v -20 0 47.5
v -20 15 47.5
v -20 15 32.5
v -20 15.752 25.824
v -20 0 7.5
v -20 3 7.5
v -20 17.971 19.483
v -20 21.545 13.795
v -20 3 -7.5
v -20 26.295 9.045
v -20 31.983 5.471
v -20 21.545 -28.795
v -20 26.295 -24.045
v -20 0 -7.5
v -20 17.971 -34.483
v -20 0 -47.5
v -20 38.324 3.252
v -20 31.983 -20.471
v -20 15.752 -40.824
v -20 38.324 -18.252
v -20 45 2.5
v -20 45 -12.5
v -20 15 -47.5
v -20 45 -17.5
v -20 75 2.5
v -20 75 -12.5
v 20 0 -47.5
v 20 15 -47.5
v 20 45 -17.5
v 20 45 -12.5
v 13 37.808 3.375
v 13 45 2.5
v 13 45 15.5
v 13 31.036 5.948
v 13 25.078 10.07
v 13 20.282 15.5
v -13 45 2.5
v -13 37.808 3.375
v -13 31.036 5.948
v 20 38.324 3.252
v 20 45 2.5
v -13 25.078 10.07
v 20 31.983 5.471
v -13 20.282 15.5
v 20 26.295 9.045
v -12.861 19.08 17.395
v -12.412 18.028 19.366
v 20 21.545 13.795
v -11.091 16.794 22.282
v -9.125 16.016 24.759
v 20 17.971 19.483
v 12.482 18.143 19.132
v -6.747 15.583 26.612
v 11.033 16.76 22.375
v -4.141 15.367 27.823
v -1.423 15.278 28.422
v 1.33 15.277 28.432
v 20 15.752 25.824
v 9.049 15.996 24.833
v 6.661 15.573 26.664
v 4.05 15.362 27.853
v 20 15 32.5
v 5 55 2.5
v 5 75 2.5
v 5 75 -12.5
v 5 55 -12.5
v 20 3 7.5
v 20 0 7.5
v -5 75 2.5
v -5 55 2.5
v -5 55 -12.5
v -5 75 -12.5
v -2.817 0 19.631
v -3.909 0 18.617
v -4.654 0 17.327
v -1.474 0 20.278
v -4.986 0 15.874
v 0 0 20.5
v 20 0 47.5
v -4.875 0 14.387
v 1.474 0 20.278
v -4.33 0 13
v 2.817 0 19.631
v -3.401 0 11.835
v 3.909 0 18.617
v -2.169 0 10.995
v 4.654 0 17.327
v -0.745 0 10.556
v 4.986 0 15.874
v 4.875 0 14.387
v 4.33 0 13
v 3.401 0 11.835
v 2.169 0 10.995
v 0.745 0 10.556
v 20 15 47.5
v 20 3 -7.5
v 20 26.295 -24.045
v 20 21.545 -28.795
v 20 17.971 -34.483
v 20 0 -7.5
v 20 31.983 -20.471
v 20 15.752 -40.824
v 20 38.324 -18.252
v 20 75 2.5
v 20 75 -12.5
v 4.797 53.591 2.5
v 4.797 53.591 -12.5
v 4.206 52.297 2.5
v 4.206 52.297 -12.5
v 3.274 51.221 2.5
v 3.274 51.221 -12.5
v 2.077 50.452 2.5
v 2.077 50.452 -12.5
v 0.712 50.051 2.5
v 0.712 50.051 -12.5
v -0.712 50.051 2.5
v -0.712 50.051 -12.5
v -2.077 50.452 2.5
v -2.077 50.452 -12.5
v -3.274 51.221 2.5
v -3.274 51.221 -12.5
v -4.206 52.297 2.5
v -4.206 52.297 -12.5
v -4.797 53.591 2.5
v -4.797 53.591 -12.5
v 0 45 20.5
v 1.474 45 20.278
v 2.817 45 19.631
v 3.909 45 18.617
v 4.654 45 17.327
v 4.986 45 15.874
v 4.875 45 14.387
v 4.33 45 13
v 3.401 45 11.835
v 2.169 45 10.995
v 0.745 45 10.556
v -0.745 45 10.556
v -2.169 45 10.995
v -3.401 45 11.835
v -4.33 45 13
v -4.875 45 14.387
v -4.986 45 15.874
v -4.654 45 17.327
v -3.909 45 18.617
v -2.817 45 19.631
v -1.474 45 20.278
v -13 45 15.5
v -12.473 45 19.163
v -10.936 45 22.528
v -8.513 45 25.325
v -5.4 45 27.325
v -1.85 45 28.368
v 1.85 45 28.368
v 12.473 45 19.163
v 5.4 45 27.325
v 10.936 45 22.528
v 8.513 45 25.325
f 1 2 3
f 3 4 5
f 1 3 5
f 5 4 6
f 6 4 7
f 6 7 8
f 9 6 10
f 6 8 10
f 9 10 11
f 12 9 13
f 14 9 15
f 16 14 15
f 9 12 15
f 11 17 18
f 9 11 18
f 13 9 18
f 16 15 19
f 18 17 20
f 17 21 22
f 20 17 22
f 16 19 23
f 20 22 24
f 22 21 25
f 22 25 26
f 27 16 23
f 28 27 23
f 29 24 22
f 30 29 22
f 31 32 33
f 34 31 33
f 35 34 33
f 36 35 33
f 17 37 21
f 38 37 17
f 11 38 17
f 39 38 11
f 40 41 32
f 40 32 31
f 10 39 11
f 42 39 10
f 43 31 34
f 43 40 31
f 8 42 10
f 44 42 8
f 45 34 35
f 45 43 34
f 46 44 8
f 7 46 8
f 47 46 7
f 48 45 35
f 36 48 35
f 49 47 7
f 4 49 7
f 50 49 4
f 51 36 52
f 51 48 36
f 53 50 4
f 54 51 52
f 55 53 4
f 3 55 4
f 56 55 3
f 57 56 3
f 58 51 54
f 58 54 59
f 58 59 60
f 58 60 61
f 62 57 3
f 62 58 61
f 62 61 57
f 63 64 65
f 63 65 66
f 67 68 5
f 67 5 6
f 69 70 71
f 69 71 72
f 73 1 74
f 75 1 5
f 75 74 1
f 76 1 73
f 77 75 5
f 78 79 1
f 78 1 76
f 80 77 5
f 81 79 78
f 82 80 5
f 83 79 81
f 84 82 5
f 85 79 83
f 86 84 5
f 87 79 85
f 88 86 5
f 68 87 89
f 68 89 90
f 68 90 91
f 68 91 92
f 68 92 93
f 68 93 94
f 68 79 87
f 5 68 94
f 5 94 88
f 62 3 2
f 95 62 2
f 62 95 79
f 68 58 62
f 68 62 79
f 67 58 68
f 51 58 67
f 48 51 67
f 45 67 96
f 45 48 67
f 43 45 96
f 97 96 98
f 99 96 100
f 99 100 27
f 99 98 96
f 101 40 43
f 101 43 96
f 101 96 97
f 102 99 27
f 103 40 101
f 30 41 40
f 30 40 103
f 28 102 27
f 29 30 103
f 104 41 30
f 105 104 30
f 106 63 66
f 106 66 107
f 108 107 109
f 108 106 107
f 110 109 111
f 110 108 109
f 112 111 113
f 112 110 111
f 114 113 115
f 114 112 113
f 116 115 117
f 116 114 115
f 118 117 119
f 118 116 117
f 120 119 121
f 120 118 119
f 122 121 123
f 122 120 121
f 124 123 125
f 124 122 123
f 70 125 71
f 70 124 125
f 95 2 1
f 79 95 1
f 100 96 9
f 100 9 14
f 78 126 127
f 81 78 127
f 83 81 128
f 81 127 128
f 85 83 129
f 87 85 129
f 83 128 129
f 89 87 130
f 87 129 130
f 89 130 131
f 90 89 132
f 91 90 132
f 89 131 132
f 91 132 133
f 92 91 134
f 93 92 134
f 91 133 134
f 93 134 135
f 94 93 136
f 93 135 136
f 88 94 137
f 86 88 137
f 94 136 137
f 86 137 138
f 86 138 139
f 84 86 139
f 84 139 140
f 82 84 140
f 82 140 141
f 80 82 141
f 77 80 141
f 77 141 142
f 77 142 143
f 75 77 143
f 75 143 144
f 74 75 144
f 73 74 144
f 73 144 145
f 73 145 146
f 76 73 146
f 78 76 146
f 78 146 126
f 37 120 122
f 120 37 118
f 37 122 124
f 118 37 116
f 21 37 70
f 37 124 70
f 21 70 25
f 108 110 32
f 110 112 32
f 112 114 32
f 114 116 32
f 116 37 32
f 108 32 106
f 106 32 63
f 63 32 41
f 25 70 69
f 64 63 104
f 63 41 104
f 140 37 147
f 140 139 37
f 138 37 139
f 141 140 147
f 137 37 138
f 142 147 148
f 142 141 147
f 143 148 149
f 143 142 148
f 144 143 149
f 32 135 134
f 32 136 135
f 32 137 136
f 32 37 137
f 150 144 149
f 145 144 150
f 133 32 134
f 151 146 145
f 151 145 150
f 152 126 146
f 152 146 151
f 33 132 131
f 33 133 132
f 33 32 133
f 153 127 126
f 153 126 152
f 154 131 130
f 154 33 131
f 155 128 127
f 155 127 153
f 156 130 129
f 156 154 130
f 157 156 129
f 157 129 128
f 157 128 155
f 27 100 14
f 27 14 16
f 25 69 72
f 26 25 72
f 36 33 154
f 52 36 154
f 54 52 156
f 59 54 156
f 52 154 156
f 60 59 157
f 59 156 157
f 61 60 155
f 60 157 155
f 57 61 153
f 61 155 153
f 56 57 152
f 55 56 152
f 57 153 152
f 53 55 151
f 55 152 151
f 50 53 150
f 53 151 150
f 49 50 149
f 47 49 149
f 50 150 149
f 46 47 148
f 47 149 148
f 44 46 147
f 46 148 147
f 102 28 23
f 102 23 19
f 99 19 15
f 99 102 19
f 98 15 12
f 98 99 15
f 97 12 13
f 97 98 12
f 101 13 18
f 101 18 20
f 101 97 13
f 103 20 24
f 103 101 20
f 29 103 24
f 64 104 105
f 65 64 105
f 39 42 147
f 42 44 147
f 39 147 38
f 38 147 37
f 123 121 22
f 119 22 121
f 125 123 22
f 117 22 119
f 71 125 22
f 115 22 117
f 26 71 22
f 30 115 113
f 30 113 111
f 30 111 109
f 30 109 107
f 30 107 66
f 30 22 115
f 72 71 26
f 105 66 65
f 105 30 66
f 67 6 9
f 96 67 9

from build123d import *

# Parameters (mm, degrees)
BOSS_EXTRUDE4_DEPTH      = 20
BOSS_EXTRUDE5_REACH      = 70.42
BOSS_EXTRUDE5_END_RADIUS = 30
SKETCH7_R                = 5
CUT_EXTRUDE1_DEPTH       = 69.419660946
SKETCH8_W                = 15
SKETCH8_H                = 30
BOSS_EXTRUDE6_DEPTH      = 40
CUT_EXTRUDE2_REACH       = 94.331


with BuildPart() as part:
    # Sketch1 → Boss-Extrude4 (new, symmetric)
    with BuildSketch(Plane(origin=(0, 0, 0), x_dir=(0, 0, -1), z_dir=(1, 0, 0))):
        with BuildLine():
            Line((-47.5, 0), (-7.5, 0))
            Line((-7.5, 0), (-7.5, 3))
            Line((-7.5, 3), (7.5, 3))
            Line((7.5, 3), (7.5, 0))
            Line((7.5, 0), (47.5, 0))
            Line((47.5, 0), (47.5, 15))
            ThreePointArc((47.5, 15), (26.286796564, 23.786796564), (17.5, 45))
            Line((17.5, 45), (12.5, 45))
            Line((12.5, 45), (-2.5, 45))
            ThreePointArc((-2.5, 45), (-11.286796564, 23.786796564), (-32.5, 15))
            Line((-32.5, 15), (-47.5, 15))
            Line((-47.5, 15), (-47.5, 0))
        make_face()
    extrude(amount=BOSS_EXTRUDE4_DEPTH, both=True)

    # Boss-Extrude5: up to this cylinder (the profile starts inside it)
    boss_extrude5_end = Plane(origin=(0, 45, 32.5), z_dir=(-1, 0, 0)) * Cylinder(BOSS_EXTRUDE5_END_RADIUS, 201.84, mode=Mode.PRIVATE)
    # Sketch6 → Boss-Extrude5 (add, up to the surface)
    with BuildSketch(Plane(origin=(0, 45, 0), x_dir=(1, 0, 0), z_dir=(0, 1, 0)), mode=Mode.PRIVATE) as boss_extrude5_sk1:
        with BuildLine():
            Line((-13, -15.5), (-13, -2.5))
            Line((-13, -2.5), (13, -2.5))
            Line((13, -2.5), (13, -15.5))
            ThreePointArc((13, -15.5), (0, -28.5), (-13, -15.5))
        make_face()
    boss_extrude5_tool1 = extrude(boss_extrude5_sk1.sketch, amount=-BOSS_EXTRUDE5_REACH, mode=Mode.PRIVATE) & boss_extrude5_end
    add(boss_extrude5_tool1.solids().sort_by_distance((0, 45, 14.286452))[0])

    # Sketch7 → Cut-Extrude1 (cut, through all)
    with BuildSketch(Plane(origin=(0, 45, 0), x_dir=(1, 0, 0), z_dir=(0, 1, 0))):
        with Locations(Location((0, -15.5, 0), (0, 0, 270))):
            Circle(SKETCH7_R)
    extrude(amount=-CUT_EXTRUDE1_DEPTH, mode=Mode.SUBTRACT)

    # Sketch8 → Boss-Extrude6 (add)
    with BuildSketch(Plane(origin=(20, 0, 0), x_dir=(0, 0, -1), z_dir=(1, 0, 0))):
        with Locations((5, 60)):
            Rectangle(SKETCH8_W, SKETCH8_H)
    extrude(amount=-BOSS_EXTRUDE6_DEPTH)

    # Sketch9 → Cut-Extrude2 (cut, up to next)
    with BuildSketch(Plane.XY.offset(2.5), mode=Mode.PRIVATE) as cut_extrude2_sk1:
        with BuildLine():
            Line((-5, 75), (5, 75))
            Line((5, 75), (5, 55))
            ThreePointArc((5, 55), (0, 50), (-5, 55))
            Line((-5, 55), (-5, 75))
        make_face()
    cut_extrude2_tool1 = extrude(cut_extrude2_sk1.sketch, amount=-CUT_EXTRUDE2_REACH, mode=Mode.PRIVATE) & part.part
    add(cut_extrude2_tool1.solids().sort_by_distance((0, 63.010479, 2.5))[0], mode=Mode.SUBTRACT)


solid = part.part
